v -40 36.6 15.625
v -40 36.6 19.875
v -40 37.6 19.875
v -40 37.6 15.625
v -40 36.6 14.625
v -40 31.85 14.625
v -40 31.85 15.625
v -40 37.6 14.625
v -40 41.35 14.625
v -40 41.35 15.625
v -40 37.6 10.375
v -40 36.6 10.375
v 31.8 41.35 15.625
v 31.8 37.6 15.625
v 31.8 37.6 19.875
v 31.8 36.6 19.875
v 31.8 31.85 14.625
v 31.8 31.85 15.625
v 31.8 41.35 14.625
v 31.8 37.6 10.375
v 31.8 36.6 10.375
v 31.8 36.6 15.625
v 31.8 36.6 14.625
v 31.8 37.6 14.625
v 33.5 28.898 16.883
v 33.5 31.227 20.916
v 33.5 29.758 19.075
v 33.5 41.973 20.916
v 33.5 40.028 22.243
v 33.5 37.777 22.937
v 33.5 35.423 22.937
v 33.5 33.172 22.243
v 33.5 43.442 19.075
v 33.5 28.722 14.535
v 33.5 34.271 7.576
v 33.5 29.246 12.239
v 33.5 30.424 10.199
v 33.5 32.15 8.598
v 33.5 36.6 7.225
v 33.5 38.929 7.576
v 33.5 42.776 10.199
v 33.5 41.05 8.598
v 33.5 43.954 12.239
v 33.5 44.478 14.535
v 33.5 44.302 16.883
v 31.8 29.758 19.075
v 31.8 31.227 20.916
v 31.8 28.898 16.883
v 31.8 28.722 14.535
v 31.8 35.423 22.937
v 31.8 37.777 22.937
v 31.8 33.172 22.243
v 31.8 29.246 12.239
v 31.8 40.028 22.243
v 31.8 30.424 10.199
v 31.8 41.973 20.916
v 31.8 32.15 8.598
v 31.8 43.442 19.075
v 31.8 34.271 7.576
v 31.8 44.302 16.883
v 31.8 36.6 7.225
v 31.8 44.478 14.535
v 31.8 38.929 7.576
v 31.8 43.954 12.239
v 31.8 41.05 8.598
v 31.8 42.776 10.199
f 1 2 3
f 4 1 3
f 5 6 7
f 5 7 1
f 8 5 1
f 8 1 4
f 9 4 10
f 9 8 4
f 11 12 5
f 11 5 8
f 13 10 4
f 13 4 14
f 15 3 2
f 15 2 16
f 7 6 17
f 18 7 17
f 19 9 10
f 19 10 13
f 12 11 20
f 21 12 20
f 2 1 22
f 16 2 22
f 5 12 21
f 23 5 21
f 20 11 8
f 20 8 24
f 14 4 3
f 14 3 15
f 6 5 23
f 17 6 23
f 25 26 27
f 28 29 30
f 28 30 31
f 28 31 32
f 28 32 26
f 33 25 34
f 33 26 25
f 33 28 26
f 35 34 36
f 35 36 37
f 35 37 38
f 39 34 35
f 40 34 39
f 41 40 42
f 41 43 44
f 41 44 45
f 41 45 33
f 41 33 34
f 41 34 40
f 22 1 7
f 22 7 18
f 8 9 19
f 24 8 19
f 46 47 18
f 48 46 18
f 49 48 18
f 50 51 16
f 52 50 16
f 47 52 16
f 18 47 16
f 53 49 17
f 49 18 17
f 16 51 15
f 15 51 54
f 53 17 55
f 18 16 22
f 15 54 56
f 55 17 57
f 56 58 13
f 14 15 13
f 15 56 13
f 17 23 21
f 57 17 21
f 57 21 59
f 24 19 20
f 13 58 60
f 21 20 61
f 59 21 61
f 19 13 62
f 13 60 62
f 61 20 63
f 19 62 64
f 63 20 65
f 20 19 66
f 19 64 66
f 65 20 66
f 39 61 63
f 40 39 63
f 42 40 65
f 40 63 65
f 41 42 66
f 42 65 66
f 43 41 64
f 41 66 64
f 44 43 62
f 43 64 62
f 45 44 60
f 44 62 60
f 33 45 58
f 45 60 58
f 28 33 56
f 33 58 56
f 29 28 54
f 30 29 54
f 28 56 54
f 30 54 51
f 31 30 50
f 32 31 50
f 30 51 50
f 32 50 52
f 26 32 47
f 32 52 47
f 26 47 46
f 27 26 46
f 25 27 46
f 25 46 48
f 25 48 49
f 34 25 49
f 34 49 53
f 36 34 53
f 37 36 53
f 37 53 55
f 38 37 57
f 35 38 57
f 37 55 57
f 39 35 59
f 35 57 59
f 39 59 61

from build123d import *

# Parameters (mm, degrees)
BOX001_W          = 71.8
BOX001_H          = 1
BOX001_DEPTH      = 9.5
CYLINDER004_R     = 7.9
CYLINDER004_DEPTH = 1.7
BOX_W             = 71.8
BOX_H             = 9.5
BOX_DEPTH         = 1


with BuildPart() as syr_plane2:
    # Box001 → Box001 (new body)
    with BuildSketch(Plane(origin=(-40, 36.6, 10.375), x_dir=(1, 0, 0), z_dir=(0, 0, 1))):
        with Locations((35.9, 0.5)):
            Rectangle(BOX001_W, BOX001_H)
    extrude(amount=BOX001_DEPTH)


with BuildPart() as syr_head:
    # Cylinder004 → Cylinder004 (new body)
    with BuildSketch(Plane(origin=(31.8, 36.6, 15.125), x_dir=(0, 0, -1), z_dir=(1, 0, 0))):
        Circle(CYLINDER004_R)
    extrude(amount=CYLINDER004_DEPTH)


with BuildPart() as fusion015:
    # Box → Box (new body)
    with BuildSketch(Plane(origin=(-40, 31.85, 14.625), x_dir=(1, 0, 0), z_dir=(0, 0, 1))):
        with Locations((35.9, 4.75)):
            Rectangle(BOX_W, BOX_H)
    extrude(amount=BOX_DEPTH)

    # Fusion015: union syr_plane2, syr_head
    add(syr_plane2.part)
    add(syr_head.part)


solid = fusion015.part
